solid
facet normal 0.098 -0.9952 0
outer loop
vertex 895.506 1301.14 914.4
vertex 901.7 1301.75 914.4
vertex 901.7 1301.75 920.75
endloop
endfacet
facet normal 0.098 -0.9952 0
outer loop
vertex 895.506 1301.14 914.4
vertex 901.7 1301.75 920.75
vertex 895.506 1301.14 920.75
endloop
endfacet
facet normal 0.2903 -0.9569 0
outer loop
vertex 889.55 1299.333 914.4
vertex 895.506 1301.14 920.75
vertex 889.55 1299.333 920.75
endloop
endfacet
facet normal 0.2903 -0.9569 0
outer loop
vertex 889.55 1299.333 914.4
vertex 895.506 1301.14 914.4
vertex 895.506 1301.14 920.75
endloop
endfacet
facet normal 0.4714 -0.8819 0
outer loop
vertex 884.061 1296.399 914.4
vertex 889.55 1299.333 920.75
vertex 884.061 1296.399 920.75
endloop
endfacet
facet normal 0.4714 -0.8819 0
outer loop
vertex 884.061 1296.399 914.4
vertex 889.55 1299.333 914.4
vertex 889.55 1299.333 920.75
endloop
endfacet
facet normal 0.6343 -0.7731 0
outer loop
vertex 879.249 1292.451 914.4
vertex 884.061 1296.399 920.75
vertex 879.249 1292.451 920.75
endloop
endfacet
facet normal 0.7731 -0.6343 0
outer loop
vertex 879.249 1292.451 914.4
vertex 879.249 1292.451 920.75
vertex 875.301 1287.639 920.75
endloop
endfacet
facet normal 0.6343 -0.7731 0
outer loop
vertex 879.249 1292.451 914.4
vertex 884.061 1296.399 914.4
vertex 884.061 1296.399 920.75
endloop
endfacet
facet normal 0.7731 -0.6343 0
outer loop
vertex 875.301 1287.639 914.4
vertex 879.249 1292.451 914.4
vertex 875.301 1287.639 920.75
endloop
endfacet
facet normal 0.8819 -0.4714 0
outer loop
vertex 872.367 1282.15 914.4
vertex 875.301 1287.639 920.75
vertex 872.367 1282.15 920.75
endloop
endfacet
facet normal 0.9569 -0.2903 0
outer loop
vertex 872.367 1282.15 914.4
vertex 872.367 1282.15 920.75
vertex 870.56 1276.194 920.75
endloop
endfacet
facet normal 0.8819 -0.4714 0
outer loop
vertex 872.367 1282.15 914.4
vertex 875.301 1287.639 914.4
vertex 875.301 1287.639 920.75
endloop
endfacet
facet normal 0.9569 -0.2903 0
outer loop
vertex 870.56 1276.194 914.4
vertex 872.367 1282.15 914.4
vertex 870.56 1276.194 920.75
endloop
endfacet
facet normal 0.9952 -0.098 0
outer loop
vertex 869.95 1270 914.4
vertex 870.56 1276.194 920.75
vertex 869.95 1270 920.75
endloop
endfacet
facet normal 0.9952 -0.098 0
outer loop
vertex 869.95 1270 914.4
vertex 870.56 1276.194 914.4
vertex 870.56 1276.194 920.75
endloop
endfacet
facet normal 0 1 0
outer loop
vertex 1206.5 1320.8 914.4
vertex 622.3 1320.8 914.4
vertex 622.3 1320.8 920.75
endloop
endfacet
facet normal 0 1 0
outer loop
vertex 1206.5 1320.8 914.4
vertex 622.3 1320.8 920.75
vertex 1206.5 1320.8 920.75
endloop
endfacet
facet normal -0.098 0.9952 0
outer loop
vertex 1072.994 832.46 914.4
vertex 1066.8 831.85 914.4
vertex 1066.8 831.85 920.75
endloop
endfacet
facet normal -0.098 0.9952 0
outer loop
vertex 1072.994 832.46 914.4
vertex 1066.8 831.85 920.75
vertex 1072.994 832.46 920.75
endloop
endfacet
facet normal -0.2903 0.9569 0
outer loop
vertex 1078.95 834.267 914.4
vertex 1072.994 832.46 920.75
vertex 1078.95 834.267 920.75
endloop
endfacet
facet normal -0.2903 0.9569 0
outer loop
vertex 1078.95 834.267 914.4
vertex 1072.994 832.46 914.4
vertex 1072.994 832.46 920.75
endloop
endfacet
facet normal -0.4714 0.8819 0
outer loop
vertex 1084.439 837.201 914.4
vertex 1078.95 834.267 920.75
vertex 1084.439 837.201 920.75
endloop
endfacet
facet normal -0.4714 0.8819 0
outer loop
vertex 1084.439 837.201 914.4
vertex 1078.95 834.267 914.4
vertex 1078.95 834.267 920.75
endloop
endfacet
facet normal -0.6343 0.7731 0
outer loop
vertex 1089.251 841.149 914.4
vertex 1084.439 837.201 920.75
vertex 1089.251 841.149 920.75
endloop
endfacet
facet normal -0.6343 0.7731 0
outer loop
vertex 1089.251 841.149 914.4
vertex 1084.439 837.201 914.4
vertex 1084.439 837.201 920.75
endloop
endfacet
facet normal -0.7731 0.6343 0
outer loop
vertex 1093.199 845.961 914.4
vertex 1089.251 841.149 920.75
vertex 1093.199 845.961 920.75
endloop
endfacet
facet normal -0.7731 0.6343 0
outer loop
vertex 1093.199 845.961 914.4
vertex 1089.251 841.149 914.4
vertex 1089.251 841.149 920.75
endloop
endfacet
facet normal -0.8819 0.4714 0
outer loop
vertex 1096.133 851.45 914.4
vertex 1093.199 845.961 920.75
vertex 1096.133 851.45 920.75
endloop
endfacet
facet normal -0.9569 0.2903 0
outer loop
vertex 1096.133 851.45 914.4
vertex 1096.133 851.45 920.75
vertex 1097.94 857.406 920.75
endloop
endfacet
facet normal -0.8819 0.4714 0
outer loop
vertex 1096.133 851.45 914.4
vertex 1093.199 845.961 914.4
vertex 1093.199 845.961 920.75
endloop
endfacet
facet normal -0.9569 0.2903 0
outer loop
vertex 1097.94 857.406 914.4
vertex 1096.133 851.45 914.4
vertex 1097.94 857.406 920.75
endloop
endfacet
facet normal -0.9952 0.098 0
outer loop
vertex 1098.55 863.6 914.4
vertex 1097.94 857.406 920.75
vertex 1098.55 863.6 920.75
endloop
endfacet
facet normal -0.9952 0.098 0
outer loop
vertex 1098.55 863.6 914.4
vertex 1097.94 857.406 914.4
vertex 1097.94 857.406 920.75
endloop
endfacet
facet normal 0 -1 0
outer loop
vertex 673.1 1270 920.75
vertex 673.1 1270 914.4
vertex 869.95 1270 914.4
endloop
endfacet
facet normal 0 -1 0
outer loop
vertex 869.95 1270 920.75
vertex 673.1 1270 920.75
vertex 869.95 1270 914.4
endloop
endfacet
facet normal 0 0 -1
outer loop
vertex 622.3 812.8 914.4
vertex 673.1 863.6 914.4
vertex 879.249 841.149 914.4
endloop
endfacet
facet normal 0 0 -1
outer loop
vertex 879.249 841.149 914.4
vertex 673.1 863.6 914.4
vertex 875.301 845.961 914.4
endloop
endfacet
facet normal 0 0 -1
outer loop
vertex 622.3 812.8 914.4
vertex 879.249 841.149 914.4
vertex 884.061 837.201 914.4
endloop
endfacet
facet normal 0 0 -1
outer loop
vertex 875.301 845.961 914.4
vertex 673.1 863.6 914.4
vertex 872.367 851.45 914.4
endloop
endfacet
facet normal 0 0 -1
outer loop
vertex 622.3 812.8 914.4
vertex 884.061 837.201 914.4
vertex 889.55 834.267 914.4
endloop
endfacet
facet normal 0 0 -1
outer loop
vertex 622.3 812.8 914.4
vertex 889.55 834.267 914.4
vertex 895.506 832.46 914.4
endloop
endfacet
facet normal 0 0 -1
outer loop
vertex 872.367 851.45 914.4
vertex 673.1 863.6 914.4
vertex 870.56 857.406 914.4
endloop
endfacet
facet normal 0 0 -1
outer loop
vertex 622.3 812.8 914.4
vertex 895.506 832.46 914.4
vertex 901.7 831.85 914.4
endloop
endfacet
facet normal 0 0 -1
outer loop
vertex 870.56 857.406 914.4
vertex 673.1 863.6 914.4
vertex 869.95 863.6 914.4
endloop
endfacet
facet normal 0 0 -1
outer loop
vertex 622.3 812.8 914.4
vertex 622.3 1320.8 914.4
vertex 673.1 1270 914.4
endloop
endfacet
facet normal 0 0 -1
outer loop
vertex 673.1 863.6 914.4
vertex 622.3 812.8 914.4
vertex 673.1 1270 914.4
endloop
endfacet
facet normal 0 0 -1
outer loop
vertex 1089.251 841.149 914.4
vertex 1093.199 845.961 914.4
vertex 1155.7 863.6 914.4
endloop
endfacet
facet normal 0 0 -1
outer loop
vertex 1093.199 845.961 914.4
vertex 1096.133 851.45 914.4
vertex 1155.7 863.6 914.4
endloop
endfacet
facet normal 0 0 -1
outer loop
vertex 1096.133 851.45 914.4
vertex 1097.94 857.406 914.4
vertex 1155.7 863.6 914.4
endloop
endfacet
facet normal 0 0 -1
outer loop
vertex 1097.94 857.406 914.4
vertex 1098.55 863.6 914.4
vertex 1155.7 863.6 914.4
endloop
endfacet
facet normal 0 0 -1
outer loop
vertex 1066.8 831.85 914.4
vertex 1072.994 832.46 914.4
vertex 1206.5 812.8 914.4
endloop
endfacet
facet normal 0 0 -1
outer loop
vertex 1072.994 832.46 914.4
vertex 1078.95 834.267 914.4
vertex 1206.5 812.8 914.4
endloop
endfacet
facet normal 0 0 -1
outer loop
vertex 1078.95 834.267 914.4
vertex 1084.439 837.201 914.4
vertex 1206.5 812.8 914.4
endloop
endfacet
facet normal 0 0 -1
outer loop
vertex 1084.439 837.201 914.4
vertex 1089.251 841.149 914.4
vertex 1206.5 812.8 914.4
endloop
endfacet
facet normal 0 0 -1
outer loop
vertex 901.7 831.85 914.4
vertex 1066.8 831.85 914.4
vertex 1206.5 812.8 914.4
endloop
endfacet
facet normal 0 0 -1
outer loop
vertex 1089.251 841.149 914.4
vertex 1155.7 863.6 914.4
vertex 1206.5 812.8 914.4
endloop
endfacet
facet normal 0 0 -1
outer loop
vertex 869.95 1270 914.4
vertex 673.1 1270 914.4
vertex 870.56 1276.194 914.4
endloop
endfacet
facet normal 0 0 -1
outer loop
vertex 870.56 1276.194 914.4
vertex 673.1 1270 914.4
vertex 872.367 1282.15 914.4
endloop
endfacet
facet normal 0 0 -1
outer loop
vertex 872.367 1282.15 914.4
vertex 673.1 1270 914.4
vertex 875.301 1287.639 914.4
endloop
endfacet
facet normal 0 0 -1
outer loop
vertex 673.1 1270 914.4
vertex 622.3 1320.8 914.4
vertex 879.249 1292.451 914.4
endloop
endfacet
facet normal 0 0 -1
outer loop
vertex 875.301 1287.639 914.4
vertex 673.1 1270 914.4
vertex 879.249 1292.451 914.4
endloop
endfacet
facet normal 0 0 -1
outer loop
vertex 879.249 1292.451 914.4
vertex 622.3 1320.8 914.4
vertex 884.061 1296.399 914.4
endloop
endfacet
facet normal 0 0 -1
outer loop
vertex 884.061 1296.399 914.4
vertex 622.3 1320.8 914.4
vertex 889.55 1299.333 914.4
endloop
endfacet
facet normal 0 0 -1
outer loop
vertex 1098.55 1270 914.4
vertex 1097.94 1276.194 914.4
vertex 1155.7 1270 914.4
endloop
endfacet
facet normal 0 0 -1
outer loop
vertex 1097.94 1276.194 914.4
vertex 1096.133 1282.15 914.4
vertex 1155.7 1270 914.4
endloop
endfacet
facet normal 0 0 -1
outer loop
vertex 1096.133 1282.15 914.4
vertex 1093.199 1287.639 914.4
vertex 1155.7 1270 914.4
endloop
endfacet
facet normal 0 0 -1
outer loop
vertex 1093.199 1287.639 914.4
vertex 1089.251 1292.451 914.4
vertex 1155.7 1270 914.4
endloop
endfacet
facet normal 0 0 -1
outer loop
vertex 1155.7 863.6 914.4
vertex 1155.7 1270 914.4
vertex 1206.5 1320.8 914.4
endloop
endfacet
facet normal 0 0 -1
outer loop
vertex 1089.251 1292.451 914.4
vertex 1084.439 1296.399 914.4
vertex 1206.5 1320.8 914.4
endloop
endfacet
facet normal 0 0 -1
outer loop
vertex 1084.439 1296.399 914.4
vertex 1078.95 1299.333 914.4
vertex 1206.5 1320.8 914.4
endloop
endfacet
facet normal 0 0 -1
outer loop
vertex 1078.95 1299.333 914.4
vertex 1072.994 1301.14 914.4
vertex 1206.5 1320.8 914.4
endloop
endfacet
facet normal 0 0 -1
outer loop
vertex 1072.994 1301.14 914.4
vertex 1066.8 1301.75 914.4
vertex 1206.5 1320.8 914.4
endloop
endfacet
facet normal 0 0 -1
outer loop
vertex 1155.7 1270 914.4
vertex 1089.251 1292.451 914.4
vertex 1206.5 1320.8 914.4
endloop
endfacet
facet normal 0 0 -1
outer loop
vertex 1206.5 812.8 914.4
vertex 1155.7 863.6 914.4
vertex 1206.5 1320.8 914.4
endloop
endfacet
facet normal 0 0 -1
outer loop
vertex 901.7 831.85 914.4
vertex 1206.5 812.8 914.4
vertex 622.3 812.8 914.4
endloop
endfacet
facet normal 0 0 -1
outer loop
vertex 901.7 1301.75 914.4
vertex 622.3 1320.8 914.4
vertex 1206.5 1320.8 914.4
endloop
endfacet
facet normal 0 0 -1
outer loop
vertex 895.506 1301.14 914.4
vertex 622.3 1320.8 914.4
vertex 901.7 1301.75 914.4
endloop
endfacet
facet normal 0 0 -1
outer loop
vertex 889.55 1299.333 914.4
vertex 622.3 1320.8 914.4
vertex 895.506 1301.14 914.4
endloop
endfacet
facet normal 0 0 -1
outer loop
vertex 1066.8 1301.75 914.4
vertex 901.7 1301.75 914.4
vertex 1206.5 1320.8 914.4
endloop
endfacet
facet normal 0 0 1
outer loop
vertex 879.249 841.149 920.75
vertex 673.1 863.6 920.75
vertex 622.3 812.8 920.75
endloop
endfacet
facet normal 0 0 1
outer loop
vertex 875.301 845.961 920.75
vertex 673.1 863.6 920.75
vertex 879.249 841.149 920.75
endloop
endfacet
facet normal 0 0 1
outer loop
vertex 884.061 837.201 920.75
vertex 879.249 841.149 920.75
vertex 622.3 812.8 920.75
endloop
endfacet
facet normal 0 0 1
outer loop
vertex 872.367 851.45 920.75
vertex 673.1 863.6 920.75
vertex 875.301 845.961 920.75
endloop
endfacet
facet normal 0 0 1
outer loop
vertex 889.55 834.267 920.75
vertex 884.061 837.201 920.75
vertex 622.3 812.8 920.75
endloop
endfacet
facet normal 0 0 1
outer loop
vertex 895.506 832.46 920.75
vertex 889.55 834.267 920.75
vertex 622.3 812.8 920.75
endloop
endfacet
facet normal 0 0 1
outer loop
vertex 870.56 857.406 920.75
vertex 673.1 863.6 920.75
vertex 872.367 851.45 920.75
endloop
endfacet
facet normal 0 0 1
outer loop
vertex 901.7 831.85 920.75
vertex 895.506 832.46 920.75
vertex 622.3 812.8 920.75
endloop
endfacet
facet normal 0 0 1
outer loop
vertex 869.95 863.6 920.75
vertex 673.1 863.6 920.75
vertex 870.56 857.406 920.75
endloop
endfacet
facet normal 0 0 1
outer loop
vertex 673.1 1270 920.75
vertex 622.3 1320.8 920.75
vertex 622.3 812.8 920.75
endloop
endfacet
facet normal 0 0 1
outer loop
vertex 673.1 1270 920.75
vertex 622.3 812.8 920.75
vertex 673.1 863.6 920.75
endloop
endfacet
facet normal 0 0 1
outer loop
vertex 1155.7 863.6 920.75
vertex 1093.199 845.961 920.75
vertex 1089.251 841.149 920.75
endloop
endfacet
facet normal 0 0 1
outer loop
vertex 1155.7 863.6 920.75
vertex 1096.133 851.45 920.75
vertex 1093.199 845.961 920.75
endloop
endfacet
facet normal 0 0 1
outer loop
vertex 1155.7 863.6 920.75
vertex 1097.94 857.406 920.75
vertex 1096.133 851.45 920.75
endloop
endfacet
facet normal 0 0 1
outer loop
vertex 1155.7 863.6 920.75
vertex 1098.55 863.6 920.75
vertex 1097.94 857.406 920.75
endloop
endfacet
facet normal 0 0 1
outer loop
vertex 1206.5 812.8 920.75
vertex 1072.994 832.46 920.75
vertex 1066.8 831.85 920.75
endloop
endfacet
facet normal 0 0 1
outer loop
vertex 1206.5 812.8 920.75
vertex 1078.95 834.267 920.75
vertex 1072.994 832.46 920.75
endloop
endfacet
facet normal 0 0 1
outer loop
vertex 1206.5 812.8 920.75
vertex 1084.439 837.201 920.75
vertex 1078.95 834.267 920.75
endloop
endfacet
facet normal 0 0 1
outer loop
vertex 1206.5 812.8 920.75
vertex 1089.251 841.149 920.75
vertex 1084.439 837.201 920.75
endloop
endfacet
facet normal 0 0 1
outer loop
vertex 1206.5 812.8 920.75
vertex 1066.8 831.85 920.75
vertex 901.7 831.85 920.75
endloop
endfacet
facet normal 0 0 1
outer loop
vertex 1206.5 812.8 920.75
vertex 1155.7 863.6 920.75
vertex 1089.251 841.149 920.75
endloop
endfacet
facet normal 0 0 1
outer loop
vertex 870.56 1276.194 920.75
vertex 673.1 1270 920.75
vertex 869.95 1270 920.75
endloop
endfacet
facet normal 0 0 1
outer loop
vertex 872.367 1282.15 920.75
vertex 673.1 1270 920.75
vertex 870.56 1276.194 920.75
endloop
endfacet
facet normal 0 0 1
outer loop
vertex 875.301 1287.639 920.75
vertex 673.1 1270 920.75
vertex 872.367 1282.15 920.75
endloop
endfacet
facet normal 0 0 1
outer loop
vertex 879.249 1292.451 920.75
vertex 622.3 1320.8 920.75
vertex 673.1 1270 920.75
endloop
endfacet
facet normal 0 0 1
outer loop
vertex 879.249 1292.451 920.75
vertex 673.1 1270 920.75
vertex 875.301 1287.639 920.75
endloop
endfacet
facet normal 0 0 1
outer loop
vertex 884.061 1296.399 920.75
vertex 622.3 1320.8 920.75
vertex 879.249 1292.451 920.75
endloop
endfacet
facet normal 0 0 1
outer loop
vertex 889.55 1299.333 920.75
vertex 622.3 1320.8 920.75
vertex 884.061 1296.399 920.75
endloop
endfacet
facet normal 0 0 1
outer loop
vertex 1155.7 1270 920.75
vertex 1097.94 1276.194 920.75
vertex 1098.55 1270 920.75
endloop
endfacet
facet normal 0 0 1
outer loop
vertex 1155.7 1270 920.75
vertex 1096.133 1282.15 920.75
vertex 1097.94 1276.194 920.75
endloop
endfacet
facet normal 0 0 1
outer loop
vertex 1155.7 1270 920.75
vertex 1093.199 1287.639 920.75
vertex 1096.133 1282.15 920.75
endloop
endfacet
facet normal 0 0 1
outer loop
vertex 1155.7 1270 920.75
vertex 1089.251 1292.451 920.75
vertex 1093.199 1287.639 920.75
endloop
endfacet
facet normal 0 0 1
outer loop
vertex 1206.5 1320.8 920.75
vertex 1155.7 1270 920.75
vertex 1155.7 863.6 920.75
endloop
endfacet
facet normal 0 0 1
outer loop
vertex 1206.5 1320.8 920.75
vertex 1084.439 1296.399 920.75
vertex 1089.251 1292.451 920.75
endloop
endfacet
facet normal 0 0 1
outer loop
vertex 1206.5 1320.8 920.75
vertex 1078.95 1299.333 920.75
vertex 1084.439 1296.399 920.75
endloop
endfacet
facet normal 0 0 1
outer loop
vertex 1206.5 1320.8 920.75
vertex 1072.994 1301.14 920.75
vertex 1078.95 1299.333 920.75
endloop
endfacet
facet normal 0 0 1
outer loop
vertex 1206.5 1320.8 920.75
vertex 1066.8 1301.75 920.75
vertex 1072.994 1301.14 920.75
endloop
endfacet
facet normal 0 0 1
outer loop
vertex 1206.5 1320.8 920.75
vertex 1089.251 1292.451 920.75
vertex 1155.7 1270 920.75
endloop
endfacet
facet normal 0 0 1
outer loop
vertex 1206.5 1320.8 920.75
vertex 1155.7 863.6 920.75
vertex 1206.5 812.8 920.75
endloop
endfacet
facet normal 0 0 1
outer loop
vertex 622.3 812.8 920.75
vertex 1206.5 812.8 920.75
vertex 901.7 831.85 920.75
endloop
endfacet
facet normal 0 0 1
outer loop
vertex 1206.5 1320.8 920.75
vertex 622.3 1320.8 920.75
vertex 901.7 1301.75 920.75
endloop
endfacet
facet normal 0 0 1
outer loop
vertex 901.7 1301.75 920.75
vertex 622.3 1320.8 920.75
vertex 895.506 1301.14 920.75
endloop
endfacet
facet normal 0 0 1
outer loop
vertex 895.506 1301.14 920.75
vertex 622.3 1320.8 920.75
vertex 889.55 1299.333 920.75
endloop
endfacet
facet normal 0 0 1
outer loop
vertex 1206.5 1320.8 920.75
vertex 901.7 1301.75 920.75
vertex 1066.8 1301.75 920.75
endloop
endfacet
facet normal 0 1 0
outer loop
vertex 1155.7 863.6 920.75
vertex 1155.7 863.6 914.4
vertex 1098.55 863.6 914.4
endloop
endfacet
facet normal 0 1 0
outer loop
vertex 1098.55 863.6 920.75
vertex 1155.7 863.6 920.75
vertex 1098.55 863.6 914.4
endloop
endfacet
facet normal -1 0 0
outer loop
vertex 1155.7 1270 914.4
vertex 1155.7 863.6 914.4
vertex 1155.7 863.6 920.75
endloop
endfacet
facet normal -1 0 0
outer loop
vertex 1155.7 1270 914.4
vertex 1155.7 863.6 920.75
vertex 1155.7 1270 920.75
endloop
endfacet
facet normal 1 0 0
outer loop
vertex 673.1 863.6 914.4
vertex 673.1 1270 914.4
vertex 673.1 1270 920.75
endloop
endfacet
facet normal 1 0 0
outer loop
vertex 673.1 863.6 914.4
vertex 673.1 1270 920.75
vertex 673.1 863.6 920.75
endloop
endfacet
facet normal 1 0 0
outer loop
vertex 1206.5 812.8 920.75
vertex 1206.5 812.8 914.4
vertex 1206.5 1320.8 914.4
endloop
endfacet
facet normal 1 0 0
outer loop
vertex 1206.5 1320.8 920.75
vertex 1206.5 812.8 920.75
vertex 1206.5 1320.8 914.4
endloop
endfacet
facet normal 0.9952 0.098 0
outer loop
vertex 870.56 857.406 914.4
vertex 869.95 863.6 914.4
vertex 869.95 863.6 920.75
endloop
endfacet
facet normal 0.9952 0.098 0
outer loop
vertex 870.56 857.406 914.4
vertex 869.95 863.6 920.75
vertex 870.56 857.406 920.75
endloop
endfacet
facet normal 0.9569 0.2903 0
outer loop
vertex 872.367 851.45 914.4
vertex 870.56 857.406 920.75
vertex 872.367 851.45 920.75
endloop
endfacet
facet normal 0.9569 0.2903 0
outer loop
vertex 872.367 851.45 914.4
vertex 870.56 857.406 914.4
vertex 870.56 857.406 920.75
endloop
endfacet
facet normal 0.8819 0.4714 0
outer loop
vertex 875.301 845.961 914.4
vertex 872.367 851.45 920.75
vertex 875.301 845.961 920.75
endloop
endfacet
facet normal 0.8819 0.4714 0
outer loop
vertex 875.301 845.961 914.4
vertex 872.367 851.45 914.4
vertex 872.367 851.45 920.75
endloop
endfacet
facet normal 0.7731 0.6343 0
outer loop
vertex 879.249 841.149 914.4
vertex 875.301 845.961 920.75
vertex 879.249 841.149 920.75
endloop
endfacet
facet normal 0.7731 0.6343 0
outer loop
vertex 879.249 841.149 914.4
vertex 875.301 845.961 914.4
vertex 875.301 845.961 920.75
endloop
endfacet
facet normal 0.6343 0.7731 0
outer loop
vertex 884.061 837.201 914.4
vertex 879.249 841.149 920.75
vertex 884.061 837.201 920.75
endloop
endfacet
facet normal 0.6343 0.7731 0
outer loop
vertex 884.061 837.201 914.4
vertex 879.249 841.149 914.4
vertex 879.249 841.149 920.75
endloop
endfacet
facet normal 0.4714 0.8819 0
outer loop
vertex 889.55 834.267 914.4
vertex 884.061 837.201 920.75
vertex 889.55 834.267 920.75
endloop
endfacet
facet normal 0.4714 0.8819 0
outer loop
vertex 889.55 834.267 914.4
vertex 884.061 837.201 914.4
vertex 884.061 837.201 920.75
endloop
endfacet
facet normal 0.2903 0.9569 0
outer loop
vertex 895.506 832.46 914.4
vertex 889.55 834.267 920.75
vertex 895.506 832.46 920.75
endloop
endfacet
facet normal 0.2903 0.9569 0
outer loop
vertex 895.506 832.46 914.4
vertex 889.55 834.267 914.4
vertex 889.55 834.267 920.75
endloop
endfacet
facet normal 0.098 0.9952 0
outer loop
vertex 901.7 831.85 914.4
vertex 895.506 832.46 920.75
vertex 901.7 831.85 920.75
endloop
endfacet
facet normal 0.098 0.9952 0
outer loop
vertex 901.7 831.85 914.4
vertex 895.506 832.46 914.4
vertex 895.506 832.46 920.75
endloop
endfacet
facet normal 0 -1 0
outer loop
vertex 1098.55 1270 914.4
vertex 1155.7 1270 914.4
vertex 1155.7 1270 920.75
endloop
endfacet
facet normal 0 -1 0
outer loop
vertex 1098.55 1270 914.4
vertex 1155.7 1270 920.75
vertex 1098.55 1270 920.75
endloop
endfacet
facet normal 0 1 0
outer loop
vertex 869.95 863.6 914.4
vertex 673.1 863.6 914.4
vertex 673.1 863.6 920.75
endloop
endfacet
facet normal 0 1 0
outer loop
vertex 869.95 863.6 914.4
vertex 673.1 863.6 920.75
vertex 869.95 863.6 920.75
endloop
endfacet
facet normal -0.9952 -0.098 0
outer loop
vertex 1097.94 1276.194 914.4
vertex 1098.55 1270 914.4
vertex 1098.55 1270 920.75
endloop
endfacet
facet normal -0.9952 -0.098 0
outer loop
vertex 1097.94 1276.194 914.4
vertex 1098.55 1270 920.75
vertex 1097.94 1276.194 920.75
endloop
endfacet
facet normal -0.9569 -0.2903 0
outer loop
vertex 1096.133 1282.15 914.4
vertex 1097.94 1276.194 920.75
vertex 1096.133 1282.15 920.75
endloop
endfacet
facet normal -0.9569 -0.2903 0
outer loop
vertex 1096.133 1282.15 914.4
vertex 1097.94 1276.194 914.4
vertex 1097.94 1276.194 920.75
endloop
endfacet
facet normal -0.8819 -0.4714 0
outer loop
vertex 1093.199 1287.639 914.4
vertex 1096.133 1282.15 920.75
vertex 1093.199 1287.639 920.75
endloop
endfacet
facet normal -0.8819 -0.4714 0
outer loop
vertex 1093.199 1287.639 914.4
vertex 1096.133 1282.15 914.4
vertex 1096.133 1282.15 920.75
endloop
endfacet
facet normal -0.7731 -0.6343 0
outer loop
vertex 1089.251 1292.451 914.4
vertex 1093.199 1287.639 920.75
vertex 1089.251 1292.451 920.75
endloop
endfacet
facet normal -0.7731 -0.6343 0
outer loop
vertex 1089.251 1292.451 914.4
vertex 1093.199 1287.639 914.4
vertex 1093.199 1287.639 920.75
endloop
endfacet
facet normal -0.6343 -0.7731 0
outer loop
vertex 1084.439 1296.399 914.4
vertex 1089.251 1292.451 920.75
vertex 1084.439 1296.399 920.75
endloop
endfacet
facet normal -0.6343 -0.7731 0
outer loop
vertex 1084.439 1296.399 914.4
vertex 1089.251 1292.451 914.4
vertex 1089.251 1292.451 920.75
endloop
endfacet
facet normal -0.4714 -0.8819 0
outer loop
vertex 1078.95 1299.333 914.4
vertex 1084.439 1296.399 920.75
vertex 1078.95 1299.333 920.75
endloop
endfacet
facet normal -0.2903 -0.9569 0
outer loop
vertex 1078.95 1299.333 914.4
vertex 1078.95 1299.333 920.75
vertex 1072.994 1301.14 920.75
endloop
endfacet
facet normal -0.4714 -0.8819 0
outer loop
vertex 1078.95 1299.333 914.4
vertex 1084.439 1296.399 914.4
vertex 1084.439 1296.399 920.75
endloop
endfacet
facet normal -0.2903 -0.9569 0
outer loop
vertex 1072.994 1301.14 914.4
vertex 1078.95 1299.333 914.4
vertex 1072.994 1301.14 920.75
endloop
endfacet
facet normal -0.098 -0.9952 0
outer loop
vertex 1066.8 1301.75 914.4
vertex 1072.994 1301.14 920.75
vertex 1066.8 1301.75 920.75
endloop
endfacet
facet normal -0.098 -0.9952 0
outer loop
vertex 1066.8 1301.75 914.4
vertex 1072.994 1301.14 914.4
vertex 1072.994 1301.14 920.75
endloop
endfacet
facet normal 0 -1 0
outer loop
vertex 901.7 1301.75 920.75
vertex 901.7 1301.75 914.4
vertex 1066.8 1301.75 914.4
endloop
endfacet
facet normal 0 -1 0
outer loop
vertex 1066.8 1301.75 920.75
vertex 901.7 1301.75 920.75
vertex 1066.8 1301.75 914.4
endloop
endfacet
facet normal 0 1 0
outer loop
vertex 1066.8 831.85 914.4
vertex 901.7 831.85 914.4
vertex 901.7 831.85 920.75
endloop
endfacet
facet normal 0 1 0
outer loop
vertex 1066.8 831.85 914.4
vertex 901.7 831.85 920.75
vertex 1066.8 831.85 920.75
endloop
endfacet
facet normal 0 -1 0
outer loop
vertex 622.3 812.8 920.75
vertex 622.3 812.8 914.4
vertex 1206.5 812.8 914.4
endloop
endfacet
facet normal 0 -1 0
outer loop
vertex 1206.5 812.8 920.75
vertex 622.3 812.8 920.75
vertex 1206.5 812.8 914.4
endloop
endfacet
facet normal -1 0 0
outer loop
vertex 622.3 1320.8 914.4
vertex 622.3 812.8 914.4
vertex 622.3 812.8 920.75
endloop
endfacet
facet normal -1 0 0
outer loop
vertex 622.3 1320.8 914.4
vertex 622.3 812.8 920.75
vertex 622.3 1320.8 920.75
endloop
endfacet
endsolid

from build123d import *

# Parameters (mm, degrees)
SKETCH_W  = 584.2
SKETCH_H  = 508
PAD_DEPTH = 6.35


with BuildPart() as part:
    # Sketch → Pad (new body)
    with BuildSketch(Plane(origin=(914.4, 1066.8, 914.4), x_dir=(1, 0, 0), z_dir=(0, 0, 1))):
        Rectangle(SKETCH_W, SKETCH_H)
        with BuildLine():
            Line((241.3, -203.2), (241.3, 203.2))
            Line((241.3, 203.2), (184.15, 203.2))
            ThreePointArc((184.15, 203.2), (174.85064, 225.65064), (152.4, 234.95))
            Line((-12.7, 234.95), (152.4, 234.95))
            ThreePointArc((-12.7, 234.95), (-35.15064, 225.65064), (-44.45, 203.2))
            Line((-241.3, 203.2), (-44.45, 203.2))
            Line((-241.3, 203.2), (-241.3, -203.2))
            Line((-241.3, -203.2), (-44.45, -203.2))
            ThreePointArc((-44.45, -203.2), (-35.15064, -225.65064), (-12.7, -234.95))
            Line((-12.7, -234.95), (152.4, -234.95))
            ThreePointArc((152.4, -234.95), (174.85064, -225.65064), (184.15, -203.2))
            Line((241.3, -203.2), (184.15, -203.2))
        make_face(mode=Mode.SUBTRACT)
    extrude(amount=PAD_DEPTH)


solid = part.part
